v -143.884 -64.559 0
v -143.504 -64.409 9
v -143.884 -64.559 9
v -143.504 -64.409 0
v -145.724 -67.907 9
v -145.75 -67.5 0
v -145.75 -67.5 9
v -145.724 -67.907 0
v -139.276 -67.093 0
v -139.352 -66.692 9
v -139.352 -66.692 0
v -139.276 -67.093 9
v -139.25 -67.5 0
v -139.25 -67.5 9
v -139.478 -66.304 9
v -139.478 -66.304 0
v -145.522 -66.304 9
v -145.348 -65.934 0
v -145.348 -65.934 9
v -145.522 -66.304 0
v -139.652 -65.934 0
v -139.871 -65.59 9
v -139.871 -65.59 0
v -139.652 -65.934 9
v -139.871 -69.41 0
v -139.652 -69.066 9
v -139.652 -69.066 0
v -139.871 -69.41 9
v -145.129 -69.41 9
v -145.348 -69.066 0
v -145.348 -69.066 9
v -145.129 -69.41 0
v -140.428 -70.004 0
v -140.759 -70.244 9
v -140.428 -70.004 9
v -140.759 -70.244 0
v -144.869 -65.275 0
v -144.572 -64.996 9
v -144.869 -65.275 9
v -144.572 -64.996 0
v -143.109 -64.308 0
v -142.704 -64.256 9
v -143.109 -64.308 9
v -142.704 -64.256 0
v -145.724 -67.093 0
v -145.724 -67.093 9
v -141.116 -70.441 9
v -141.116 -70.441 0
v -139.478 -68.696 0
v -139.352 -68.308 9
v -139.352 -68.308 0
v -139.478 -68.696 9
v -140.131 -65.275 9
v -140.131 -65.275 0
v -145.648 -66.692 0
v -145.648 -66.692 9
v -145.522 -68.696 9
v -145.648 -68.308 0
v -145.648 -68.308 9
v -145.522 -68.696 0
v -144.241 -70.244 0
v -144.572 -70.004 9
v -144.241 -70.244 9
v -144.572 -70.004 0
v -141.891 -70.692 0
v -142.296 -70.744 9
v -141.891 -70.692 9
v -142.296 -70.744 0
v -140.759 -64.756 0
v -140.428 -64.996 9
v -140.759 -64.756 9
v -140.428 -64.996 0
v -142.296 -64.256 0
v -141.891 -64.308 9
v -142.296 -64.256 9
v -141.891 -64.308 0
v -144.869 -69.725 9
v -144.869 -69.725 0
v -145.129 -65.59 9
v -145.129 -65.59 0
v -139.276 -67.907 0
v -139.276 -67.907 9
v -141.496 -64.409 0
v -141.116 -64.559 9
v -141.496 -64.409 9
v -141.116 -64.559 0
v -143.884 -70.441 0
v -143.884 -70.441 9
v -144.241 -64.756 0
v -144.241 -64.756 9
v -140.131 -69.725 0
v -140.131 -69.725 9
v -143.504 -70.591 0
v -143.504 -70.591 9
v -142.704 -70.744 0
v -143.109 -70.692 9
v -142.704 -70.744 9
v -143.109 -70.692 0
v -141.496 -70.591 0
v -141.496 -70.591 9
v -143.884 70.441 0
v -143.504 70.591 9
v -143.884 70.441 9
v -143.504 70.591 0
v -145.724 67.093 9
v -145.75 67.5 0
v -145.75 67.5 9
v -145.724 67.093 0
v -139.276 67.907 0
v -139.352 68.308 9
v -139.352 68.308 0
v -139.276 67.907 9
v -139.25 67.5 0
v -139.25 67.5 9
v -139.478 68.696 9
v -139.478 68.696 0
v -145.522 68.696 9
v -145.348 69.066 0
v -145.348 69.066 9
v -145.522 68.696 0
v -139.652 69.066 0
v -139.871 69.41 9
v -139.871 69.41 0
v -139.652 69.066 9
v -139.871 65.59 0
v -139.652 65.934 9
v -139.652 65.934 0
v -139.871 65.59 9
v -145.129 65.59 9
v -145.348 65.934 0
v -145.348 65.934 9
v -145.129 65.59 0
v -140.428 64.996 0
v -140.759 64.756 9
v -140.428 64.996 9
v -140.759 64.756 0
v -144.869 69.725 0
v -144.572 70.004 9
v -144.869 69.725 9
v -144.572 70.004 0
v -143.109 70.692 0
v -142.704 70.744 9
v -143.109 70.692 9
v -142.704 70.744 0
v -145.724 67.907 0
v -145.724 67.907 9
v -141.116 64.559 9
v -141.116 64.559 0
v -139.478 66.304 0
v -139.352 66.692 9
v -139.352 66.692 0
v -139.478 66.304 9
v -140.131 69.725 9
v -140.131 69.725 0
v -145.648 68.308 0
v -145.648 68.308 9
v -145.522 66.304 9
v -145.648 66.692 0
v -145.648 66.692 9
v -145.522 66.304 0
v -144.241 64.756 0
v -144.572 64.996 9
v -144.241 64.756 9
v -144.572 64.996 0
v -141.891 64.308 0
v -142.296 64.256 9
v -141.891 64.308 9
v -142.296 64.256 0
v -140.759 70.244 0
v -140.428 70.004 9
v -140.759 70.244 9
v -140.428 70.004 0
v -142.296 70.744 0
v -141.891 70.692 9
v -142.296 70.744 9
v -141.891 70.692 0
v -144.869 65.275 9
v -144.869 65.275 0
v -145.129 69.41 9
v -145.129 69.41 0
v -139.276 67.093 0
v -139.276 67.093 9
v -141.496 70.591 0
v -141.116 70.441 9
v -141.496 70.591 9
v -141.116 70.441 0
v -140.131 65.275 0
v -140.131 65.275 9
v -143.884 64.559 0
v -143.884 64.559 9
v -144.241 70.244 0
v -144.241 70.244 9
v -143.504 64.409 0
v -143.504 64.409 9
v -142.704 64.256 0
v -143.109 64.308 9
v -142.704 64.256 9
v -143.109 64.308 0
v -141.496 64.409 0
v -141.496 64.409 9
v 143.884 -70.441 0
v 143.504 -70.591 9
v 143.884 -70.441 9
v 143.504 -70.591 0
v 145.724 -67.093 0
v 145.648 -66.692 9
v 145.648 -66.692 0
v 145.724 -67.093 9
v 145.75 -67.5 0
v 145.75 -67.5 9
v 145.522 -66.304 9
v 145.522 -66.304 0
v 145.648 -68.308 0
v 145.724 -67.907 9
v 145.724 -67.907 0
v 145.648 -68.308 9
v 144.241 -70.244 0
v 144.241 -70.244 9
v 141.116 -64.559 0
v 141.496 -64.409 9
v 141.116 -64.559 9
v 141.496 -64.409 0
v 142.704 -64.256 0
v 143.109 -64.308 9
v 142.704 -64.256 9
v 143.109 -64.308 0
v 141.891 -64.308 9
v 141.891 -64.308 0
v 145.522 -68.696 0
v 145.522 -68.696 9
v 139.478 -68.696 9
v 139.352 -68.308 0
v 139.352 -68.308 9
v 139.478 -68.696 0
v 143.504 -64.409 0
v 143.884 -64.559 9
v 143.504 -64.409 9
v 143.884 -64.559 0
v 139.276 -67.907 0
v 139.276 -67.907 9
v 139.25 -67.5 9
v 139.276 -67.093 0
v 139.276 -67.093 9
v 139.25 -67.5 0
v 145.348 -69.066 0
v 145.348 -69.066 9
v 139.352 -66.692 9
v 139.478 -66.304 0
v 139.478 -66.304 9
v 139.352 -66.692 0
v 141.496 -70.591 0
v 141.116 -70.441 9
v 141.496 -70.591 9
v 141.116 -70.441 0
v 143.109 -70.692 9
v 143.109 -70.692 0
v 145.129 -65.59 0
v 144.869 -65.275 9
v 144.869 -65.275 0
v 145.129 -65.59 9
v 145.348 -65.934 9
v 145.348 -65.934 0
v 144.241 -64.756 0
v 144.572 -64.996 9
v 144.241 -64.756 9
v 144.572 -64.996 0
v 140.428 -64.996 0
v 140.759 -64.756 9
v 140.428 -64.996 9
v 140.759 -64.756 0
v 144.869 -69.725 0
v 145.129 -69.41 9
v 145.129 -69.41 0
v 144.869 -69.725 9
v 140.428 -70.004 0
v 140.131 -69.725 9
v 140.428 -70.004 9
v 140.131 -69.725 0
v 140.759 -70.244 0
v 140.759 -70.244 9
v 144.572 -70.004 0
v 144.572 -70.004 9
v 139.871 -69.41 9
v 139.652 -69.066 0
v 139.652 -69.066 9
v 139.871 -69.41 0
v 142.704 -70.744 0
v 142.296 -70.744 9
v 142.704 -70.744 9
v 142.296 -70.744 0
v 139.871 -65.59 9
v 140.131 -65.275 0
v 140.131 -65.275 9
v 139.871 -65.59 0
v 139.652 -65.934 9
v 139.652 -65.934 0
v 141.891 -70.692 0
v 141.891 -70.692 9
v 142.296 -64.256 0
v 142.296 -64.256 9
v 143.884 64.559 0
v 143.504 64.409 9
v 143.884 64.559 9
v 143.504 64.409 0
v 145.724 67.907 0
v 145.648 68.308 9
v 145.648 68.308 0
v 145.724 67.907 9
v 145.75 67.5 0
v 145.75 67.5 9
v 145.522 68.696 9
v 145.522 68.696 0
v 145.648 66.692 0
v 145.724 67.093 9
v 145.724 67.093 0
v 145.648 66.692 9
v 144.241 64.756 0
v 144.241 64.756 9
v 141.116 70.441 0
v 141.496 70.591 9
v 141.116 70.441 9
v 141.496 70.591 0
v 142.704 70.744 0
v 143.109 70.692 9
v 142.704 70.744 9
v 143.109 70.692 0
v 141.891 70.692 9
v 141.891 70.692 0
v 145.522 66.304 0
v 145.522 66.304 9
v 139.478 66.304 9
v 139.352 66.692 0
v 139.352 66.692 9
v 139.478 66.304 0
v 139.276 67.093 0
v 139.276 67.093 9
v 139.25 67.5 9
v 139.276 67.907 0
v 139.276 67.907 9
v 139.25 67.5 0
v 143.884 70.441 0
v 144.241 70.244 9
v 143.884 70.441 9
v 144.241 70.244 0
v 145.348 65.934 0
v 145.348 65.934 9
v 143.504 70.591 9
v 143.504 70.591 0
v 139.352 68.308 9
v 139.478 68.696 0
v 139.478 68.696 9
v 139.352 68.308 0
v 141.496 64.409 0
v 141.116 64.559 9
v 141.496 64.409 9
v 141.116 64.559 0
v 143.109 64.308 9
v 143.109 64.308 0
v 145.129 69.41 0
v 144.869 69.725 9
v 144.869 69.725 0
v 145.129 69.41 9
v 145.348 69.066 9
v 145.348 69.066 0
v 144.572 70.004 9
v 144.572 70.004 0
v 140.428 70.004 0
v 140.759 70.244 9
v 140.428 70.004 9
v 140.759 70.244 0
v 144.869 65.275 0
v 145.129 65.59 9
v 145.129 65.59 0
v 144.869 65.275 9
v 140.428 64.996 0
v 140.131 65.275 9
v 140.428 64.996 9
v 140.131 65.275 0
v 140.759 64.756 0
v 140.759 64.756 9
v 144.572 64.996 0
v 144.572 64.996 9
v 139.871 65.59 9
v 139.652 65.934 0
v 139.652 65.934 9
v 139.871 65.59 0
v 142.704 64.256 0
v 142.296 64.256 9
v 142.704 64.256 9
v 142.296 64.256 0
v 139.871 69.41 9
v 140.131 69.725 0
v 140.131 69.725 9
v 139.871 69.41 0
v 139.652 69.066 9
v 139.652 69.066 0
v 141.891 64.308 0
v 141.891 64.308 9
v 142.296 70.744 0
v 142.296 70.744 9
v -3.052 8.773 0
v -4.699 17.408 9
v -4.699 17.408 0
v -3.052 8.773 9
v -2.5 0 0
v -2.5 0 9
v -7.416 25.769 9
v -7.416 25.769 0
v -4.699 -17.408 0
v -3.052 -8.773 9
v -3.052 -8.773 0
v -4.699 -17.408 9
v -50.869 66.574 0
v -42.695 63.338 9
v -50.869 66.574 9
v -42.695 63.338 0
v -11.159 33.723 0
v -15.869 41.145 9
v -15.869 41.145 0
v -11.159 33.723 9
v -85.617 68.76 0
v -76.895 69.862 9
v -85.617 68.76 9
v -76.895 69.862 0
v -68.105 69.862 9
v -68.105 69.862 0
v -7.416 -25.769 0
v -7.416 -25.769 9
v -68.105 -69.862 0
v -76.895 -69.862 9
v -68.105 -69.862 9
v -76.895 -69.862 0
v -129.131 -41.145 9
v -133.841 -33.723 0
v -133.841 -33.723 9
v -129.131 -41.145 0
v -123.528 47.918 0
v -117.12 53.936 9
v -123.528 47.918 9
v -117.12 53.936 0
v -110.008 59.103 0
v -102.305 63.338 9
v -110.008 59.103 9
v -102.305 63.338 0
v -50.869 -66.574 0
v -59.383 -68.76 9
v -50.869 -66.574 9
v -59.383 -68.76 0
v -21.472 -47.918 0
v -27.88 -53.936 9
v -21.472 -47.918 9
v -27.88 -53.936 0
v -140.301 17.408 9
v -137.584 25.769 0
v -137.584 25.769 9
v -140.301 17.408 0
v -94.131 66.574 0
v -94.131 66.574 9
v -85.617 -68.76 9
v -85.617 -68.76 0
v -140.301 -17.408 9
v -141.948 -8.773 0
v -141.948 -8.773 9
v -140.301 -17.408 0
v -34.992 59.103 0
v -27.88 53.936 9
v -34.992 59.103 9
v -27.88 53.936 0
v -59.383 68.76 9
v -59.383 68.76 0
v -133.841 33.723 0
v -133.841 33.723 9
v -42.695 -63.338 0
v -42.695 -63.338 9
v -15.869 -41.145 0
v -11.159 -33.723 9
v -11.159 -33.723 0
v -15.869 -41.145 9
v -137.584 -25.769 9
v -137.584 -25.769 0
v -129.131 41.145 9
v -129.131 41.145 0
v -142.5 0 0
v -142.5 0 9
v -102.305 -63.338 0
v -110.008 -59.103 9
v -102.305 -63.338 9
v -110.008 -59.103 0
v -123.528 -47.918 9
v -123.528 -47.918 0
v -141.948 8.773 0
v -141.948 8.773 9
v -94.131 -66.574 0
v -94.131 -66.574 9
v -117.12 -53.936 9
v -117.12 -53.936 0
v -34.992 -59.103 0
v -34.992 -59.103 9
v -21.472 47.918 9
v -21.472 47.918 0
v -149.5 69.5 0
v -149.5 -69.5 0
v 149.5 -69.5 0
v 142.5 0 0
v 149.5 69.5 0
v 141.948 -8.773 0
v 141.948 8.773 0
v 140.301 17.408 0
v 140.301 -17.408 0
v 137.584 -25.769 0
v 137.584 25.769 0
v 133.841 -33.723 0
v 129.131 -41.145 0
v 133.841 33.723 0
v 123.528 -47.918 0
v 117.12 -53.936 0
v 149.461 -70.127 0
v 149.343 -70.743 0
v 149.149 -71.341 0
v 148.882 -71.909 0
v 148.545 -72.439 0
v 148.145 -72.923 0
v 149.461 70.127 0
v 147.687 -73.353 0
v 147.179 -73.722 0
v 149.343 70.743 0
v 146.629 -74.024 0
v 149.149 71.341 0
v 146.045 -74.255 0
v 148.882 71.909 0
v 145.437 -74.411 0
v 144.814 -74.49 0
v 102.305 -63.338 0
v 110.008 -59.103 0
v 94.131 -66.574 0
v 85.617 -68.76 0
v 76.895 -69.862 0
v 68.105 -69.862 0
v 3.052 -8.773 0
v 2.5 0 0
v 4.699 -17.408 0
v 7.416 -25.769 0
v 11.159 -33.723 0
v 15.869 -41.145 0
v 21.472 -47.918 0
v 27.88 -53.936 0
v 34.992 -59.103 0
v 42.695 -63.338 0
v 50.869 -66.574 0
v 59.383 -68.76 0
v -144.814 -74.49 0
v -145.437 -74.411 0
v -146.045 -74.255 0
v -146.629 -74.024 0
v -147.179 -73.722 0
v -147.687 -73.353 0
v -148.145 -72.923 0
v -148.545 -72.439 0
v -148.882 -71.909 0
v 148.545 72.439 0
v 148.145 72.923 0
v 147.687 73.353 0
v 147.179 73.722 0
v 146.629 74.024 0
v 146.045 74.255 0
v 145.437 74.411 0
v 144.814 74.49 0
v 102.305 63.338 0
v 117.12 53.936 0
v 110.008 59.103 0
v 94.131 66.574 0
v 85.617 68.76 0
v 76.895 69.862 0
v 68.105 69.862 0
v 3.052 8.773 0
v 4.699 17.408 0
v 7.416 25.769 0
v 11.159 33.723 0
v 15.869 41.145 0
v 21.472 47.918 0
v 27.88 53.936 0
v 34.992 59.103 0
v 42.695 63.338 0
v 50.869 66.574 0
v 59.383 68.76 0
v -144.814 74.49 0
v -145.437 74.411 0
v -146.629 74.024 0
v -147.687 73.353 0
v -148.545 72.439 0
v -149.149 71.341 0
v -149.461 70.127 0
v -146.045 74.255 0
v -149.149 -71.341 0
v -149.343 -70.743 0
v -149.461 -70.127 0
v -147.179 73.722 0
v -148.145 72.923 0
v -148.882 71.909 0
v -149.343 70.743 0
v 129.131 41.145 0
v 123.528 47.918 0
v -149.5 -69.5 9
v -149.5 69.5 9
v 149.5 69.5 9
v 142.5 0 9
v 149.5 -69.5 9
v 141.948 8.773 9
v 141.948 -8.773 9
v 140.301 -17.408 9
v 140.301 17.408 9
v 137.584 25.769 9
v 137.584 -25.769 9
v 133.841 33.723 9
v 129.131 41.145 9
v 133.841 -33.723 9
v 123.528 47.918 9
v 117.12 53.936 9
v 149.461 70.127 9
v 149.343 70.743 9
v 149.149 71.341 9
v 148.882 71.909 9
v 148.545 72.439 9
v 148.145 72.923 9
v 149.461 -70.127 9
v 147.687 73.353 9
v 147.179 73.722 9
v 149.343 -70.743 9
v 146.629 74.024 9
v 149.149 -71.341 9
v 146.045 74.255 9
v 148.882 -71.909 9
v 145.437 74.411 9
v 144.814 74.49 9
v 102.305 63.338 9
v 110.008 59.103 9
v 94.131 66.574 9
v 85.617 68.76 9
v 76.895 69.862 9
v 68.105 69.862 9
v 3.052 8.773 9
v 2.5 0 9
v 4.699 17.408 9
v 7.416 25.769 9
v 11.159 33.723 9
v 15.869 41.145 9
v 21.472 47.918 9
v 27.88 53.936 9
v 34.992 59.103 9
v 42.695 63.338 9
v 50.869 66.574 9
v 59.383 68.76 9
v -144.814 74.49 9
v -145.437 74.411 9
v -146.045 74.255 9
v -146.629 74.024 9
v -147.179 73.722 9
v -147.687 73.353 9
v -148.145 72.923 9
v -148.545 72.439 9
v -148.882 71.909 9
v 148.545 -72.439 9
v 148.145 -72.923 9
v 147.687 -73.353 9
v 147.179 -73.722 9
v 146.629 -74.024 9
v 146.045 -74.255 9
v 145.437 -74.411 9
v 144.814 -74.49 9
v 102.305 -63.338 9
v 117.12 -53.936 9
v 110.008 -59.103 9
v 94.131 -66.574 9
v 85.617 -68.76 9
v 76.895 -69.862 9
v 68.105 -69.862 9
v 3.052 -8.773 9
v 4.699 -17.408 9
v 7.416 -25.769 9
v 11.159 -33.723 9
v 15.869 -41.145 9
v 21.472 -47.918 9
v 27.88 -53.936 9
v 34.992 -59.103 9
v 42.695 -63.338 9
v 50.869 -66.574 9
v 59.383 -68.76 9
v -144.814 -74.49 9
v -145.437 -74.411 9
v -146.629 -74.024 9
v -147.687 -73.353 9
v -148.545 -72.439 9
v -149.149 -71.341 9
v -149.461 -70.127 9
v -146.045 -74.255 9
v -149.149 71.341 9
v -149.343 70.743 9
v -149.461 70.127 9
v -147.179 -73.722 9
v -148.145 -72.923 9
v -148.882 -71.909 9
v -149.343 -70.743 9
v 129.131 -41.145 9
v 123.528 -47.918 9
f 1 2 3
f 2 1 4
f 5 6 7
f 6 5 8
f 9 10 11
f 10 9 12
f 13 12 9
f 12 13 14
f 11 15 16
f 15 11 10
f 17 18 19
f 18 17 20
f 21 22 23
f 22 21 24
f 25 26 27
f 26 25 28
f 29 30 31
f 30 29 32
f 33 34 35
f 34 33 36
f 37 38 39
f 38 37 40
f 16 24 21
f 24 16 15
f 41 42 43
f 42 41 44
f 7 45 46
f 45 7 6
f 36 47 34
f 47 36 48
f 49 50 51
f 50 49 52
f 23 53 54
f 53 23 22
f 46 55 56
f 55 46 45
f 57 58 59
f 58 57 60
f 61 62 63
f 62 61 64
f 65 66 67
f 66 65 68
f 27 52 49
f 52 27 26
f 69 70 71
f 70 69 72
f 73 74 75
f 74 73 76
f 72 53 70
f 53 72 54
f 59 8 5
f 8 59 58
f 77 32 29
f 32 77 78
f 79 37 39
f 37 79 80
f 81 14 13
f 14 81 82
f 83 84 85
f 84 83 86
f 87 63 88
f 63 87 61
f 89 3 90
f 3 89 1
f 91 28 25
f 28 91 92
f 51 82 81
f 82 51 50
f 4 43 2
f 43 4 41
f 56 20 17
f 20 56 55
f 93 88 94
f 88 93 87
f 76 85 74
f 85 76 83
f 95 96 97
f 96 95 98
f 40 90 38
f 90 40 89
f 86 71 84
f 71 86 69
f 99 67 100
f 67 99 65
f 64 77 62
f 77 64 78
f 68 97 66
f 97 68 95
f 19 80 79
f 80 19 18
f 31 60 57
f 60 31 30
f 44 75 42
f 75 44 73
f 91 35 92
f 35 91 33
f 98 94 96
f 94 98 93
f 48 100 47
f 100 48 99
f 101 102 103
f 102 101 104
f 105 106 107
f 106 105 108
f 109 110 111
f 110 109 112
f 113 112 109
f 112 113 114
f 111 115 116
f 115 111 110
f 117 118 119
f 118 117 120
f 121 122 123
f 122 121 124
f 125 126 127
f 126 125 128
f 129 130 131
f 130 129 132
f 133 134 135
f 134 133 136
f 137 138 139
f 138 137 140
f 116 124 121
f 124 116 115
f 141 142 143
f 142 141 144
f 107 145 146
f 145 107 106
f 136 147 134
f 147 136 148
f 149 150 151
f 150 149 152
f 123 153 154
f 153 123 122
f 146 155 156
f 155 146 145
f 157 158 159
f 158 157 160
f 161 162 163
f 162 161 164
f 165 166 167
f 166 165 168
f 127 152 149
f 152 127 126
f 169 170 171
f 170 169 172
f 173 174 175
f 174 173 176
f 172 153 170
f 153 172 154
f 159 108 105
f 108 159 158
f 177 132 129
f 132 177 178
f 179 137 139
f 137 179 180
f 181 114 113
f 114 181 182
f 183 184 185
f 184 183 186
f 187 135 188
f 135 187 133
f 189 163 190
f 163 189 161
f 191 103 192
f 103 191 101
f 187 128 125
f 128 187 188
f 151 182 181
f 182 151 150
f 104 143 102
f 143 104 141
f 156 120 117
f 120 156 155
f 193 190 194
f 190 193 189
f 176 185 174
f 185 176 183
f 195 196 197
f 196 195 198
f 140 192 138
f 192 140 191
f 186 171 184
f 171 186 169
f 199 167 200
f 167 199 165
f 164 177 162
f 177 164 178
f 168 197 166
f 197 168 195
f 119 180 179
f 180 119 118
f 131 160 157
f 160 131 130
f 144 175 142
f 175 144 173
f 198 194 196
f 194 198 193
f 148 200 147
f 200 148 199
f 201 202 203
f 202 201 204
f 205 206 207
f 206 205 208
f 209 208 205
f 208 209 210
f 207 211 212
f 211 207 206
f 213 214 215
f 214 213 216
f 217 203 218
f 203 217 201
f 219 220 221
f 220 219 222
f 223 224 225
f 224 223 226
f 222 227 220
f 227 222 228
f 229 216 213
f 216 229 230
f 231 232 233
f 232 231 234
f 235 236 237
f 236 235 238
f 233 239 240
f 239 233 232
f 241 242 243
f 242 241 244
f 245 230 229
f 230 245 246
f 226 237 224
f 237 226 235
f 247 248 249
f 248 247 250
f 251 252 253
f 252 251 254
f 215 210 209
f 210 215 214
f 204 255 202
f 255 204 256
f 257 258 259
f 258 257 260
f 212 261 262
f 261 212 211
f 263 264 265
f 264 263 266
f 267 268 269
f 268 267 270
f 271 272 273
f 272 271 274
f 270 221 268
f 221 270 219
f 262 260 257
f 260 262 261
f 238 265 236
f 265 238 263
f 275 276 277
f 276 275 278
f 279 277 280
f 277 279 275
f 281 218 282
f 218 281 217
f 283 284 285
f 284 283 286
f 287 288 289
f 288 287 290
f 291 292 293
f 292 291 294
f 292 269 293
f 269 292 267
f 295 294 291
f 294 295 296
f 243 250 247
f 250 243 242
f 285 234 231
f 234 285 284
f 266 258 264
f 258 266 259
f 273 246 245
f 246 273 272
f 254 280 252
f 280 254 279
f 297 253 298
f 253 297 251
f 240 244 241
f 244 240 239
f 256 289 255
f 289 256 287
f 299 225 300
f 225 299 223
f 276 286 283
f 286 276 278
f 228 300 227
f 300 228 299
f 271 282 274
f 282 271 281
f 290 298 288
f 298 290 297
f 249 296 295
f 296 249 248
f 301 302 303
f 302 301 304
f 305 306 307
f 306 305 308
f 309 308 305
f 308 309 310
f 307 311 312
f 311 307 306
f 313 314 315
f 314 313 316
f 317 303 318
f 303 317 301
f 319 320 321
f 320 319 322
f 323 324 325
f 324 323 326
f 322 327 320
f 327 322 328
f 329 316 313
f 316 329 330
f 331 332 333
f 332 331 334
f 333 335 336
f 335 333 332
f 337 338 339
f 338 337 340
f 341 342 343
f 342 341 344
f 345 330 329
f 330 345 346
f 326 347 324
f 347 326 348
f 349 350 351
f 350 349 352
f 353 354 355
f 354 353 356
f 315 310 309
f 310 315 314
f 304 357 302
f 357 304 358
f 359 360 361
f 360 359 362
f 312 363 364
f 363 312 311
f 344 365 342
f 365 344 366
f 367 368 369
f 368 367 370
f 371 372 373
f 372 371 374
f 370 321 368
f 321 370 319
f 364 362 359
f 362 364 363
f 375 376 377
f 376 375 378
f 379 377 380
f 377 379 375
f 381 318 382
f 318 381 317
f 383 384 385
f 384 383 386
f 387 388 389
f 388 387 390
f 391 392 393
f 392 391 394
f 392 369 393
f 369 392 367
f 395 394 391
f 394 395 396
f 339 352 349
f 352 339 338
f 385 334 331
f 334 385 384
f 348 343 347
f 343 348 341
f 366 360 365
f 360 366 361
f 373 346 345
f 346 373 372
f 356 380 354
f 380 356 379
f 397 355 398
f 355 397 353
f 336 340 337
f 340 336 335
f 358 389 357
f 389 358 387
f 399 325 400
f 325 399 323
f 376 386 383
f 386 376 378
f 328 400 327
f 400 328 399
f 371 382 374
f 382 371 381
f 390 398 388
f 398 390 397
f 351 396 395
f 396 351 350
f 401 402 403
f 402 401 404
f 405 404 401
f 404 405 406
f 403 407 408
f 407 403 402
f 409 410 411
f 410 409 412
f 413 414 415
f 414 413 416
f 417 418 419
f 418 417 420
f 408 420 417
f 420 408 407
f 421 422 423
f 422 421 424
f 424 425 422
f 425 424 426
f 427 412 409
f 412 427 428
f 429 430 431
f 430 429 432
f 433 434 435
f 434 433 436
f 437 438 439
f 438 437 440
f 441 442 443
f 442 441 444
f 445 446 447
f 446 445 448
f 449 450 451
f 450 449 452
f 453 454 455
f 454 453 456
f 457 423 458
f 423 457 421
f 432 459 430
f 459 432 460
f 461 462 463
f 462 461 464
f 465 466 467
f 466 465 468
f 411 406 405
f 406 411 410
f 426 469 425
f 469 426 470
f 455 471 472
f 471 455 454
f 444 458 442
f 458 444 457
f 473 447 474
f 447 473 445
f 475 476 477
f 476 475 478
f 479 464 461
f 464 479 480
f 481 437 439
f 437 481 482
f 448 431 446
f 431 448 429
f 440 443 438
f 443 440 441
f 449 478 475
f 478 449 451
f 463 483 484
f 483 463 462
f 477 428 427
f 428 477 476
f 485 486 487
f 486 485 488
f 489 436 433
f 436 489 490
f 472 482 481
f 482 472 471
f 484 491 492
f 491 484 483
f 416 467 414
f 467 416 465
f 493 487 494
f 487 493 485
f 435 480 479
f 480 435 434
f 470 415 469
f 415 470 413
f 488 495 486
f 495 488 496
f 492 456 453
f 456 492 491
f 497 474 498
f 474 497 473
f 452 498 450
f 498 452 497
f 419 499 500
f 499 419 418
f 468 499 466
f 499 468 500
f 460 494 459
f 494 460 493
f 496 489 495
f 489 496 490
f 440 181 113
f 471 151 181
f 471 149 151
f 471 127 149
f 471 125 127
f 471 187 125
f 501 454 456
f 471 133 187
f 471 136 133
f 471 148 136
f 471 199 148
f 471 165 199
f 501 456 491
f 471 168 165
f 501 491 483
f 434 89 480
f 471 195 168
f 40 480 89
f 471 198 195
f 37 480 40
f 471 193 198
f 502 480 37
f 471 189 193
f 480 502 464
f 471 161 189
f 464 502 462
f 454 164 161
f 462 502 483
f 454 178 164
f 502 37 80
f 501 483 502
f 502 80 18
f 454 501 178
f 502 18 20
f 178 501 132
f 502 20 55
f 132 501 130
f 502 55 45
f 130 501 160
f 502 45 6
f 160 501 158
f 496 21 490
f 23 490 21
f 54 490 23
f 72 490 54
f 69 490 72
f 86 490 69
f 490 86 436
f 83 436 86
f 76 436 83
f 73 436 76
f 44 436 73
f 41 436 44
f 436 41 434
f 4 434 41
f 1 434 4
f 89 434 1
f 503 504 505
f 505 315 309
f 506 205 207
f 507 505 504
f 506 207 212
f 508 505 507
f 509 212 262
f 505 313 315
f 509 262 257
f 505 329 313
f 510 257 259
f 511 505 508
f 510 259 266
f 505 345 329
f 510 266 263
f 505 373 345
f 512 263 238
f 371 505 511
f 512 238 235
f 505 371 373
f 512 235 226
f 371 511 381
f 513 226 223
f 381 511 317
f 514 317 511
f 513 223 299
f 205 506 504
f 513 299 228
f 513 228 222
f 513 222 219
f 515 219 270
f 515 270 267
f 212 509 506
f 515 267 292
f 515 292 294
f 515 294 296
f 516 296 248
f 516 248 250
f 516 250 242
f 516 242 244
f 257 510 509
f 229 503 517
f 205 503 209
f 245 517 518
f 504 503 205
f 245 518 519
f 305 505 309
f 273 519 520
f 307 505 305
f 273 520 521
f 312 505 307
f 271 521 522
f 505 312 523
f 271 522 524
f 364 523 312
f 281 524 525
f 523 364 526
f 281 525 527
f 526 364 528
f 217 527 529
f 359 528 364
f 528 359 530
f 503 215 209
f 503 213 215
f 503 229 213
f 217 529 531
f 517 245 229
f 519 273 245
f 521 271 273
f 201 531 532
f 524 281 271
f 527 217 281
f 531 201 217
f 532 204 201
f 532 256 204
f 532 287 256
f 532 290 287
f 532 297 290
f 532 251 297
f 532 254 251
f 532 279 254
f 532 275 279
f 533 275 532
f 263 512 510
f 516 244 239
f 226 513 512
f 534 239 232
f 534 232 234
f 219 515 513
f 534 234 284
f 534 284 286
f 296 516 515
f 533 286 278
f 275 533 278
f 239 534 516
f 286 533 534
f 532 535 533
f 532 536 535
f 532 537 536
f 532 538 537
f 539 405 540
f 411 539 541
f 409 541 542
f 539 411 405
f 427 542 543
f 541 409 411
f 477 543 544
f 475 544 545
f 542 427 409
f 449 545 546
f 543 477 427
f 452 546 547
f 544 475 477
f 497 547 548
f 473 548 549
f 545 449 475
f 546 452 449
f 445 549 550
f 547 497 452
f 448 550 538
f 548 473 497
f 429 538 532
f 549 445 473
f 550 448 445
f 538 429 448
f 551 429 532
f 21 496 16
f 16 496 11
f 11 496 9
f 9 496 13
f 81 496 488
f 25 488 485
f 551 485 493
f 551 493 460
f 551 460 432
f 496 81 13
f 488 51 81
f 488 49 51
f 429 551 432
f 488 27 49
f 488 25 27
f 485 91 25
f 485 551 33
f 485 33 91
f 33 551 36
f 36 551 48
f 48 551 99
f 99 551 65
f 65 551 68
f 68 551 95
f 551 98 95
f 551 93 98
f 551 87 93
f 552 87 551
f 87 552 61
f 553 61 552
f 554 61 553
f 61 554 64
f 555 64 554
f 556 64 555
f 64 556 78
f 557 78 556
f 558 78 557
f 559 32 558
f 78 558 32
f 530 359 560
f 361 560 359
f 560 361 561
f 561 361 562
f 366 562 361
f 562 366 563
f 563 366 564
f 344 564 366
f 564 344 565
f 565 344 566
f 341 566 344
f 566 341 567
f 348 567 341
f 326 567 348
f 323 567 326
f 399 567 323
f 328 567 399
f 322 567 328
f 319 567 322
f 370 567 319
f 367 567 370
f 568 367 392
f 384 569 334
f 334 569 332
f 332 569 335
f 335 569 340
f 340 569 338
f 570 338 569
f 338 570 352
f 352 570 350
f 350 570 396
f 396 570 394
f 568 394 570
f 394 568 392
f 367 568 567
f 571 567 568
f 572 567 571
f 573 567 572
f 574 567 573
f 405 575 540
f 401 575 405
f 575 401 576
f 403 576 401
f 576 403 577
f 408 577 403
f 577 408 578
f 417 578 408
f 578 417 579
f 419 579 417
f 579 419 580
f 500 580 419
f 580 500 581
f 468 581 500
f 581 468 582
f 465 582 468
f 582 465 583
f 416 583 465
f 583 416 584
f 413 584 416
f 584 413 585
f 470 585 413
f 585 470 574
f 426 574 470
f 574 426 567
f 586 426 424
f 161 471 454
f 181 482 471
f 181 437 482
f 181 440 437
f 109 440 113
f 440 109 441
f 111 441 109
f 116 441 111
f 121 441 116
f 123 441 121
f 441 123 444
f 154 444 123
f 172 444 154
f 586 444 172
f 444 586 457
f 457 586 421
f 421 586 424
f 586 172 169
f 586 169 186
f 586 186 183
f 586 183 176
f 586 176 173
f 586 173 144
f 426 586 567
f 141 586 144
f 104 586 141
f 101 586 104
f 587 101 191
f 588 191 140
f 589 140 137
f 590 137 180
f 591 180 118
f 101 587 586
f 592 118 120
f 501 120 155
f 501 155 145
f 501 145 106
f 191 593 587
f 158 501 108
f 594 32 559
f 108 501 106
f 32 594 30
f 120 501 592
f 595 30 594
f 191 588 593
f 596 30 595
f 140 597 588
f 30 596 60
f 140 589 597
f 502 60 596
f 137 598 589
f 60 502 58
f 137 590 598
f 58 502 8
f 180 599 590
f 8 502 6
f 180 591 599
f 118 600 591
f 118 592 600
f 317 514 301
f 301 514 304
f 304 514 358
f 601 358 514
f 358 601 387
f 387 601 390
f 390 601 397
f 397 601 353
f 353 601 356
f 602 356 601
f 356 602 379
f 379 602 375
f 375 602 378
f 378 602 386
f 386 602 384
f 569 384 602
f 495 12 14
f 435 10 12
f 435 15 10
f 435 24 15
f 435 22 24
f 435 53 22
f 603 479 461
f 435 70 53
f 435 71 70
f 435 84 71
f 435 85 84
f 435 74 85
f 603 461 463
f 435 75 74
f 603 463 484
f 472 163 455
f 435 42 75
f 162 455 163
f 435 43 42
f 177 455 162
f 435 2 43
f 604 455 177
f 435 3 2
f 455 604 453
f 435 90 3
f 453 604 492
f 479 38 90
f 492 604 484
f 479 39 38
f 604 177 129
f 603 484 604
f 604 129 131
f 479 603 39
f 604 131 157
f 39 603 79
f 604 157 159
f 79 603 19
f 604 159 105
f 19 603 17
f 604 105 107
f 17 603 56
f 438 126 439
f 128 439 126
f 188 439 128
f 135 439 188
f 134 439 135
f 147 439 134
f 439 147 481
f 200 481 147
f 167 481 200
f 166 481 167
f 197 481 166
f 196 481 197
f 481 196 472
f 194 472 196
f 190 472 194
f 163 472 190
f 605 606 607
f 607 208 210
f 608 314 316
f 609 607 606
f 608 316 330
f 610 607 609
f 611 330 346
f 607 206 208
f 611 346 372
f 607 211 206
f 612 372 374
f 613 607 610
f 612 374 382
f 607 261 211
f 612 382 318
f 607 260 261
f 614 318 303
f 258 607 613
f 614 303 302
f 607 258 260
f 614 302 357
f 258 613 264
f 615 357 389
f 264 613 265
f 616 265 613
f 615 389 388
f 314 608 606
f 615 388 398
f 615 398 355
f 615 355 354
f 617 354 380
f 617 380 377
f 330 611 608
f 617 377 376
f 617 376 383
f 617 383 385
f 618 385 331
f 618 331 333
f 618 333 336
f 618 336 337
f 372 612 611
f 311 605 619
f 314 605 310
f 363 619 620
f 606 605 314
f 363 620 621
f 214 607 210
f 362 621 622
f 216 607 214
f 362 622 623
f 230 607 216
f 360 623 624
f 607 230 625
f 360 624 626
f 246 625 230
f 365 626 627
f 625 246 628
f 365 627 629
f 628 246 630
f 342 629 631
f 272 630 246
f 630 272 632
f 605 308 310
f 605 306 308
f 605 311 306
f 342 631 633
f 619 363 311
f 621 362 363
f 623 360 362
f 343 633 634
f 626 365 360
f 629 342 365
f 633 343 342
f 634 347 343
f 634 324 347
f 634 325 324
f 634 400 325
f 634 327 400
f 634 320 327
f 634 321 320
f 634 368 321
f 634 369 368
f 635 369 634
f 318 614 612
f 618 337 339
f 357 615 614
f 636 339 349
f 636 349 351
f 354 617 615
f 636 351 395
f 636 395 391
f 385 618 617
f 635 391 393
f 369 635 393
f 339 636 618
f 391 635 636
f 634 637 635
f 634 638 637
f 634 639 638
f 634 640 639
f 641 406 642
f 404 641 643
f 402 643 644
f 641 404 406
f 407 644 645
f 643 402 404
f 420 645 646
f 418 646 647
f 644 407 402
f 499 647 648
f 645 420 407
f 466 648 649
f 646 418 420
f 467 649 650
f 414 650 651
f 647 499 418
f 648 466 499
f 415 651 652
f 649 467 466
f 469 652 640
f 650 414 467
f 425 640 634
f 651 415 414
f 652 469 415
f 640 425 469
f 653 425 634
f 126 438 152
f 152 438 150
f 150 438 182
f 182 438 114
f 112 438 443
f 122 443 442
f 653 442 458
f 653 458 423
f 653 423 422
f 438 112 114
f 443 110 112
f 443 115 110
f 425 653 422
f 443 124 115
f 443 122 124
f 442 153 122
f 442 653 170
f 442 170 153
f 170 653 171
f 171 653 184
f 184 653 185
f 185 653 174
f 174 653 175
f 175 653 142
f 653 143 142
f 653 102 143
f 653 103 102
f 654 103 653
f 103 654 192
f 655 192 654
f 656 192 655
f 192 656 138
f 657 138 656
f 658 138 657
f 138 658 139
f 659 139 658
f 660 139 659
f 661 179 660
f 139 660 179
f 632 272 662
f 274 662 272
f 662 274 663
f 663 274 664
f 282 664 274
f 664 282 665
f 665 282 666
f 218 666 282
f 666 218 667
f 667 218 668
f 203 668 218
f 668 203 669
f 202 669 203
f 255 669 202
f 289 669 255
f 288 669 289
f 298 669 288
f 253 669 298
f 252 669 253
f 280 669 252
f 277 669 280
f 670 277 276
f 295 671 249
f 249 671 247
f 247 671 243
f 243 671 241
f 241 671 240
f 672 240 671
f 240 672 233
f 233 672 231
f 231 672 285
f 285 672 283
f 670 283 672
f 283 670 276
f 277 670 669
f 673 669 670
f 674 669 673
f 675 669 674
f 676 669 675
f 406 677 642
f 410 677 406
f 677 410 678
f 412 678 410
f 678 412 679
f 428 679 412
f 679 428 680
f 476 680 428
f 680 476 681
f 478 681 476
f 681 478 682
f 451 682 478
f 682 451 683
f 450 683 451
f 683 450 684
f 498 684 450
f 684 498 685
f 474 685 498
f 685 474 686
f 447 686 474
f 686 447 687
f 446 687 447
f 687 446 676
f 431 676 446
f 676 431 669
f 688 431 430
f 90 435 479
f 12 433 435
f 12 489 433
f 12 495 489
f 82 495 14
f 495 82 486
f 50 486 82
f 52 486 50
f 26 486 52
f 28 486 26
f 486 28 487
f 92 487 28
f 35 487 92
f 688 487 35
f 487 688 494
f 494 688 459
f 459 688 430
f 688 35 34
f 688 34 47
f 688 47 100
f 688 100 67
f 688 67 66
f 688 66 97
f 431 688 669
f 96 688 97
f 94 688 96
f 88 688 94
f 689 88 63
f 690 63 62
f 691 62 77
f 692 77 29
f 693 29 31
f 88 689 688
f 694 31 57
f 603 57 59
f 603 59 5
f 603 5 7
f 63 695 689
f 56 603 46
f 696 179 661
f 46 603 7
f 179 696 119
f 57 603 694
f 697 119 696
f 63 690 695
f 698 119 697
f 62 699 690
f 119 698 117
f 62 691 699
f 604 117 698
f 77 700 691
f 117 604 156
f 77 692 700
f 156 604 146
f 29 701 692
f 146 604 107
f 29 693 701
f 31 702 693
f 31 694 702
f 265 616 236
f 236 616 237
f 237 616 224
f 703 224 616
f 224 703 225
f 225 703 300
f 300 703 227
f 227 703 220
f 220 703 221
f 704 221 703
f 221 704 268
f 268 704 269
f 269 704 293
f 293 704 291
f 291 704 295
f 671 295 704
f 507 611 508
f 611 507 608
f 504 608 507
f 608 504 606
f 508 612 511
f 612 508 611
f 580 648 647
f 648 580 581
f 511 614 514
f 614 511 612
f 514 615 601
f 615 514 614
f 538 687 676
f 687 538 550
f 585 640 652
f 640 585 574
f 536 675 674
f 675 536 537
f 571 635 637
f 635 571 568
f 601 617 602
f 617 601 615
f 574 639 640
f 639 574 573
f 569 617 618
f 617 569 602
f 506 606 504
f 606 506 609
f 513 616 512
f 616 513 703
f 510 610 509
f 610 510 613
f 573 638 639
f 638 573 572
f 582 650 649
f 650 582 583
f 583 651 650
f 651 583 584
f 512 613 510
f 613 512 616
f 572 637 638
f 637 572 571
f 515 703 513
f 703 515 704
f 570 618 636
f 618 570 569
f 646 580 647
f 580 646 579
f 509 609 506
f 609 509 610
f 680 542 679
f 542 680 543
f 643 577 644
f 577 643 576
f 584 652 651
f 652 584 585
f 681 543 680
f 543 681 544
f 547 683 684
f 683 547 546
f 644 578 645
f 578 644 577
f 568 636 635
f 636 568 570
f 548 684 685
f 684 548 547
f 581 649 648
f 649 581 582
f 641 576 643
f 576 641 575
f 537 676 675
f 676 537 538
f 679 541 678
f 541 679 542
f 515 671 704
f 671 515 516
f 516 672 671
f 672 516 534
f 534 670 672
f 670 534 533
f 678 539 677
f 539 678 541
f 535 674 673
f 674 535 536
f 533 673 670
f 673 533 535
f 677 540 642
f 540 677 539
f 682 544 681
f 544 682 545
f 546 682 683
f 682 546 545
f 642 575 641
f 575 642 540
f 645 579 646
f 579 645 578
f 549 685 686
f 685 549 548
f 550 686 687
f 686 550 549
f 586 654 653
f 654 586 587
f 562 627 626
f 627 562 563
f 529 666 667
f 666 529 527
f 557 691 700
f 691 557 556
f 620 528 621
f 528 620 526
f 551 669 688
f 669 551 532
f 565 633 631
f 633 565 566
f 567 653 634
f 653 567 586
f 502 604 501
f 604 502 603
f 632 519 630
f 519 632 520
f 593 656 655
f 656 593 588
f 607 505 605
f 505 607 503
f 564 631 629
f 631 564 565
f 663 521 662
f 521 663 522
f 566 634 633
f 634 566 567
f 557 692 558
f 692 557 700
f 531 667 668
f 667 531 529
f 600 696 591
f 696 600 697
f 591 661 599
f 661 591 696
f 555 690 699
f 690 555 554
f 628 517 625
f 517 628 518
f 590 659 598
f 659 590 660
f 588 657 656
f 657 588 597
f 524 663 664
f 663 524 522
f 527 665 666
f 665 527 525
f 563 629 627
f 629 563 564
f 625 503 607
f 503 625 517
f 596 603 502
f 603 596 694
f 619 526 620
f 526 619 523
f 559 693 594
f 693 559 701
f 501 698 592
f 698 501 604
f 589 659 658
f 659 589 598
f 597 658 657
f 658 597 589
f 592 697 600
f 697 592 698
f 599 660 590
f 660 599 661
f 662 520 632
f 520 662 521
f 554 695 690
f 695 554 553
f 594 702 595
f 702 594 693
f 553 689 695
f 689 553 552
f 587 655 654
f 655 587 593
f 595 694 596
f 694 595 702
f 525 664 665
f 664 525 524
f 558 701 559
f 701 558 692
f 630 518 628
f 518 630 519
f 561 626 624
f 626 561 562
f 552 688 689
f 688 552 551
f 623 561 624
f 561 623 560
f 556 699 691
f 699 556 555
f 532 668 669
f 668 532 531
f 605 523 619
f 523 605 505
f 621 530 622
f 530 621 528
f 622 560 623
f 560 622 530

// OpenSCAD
$fn = 50;


difference() {
	union() {
		hull() {
			translate(v = [-144.5000000000, 69.5000000000, 0]) {
				cylinder(h = 9, r = 5);
			}
			translate(v = [144.5000000000, 69.5000000000, 0]) {
				cylinder(h = 9, r = 5);
			}
			translate(v = [-144.5000000000, -69.5000000000, 0]) {
				cylinder(h = 9, r = 5);
			}
			translate(v = [144.5000000000, -69.5000000000, 0]) {
				cylinder(h = 9, r = 5);
			}
		}
	}
	union() {
		#translate(v = [-142.5000000000, -67.5000000000, -100.0000000000]) {
			cylinder(h = 200, r = 3.2500000000);
		}
		#translate(v = [-142.5000000000, 67.5000000000, -100.0000000000]) {
			cylinder(h = 200, r = 3.2500000000);
		}
		#translate(v = [142.5000000000, -67.5000000000, -100.0000000000]) {
			cylinder(h = 200, r = 3.2500000000);
		}
		#translate(v = [142.5000000000, 67.5000000000, -100.0000000000]) {
			cylinder(h = 200, r = 3.2500000000);
		}
		#translate(v = [-72.5000000000, 0, 0]) {
			cylinder(h = 9, r = 70.0000000000);
		}
		#translate(v = [72.5000000000, 0, 0]) {
			cylinder(h = 9, r = 70.0000000000);
		}
	}
}
